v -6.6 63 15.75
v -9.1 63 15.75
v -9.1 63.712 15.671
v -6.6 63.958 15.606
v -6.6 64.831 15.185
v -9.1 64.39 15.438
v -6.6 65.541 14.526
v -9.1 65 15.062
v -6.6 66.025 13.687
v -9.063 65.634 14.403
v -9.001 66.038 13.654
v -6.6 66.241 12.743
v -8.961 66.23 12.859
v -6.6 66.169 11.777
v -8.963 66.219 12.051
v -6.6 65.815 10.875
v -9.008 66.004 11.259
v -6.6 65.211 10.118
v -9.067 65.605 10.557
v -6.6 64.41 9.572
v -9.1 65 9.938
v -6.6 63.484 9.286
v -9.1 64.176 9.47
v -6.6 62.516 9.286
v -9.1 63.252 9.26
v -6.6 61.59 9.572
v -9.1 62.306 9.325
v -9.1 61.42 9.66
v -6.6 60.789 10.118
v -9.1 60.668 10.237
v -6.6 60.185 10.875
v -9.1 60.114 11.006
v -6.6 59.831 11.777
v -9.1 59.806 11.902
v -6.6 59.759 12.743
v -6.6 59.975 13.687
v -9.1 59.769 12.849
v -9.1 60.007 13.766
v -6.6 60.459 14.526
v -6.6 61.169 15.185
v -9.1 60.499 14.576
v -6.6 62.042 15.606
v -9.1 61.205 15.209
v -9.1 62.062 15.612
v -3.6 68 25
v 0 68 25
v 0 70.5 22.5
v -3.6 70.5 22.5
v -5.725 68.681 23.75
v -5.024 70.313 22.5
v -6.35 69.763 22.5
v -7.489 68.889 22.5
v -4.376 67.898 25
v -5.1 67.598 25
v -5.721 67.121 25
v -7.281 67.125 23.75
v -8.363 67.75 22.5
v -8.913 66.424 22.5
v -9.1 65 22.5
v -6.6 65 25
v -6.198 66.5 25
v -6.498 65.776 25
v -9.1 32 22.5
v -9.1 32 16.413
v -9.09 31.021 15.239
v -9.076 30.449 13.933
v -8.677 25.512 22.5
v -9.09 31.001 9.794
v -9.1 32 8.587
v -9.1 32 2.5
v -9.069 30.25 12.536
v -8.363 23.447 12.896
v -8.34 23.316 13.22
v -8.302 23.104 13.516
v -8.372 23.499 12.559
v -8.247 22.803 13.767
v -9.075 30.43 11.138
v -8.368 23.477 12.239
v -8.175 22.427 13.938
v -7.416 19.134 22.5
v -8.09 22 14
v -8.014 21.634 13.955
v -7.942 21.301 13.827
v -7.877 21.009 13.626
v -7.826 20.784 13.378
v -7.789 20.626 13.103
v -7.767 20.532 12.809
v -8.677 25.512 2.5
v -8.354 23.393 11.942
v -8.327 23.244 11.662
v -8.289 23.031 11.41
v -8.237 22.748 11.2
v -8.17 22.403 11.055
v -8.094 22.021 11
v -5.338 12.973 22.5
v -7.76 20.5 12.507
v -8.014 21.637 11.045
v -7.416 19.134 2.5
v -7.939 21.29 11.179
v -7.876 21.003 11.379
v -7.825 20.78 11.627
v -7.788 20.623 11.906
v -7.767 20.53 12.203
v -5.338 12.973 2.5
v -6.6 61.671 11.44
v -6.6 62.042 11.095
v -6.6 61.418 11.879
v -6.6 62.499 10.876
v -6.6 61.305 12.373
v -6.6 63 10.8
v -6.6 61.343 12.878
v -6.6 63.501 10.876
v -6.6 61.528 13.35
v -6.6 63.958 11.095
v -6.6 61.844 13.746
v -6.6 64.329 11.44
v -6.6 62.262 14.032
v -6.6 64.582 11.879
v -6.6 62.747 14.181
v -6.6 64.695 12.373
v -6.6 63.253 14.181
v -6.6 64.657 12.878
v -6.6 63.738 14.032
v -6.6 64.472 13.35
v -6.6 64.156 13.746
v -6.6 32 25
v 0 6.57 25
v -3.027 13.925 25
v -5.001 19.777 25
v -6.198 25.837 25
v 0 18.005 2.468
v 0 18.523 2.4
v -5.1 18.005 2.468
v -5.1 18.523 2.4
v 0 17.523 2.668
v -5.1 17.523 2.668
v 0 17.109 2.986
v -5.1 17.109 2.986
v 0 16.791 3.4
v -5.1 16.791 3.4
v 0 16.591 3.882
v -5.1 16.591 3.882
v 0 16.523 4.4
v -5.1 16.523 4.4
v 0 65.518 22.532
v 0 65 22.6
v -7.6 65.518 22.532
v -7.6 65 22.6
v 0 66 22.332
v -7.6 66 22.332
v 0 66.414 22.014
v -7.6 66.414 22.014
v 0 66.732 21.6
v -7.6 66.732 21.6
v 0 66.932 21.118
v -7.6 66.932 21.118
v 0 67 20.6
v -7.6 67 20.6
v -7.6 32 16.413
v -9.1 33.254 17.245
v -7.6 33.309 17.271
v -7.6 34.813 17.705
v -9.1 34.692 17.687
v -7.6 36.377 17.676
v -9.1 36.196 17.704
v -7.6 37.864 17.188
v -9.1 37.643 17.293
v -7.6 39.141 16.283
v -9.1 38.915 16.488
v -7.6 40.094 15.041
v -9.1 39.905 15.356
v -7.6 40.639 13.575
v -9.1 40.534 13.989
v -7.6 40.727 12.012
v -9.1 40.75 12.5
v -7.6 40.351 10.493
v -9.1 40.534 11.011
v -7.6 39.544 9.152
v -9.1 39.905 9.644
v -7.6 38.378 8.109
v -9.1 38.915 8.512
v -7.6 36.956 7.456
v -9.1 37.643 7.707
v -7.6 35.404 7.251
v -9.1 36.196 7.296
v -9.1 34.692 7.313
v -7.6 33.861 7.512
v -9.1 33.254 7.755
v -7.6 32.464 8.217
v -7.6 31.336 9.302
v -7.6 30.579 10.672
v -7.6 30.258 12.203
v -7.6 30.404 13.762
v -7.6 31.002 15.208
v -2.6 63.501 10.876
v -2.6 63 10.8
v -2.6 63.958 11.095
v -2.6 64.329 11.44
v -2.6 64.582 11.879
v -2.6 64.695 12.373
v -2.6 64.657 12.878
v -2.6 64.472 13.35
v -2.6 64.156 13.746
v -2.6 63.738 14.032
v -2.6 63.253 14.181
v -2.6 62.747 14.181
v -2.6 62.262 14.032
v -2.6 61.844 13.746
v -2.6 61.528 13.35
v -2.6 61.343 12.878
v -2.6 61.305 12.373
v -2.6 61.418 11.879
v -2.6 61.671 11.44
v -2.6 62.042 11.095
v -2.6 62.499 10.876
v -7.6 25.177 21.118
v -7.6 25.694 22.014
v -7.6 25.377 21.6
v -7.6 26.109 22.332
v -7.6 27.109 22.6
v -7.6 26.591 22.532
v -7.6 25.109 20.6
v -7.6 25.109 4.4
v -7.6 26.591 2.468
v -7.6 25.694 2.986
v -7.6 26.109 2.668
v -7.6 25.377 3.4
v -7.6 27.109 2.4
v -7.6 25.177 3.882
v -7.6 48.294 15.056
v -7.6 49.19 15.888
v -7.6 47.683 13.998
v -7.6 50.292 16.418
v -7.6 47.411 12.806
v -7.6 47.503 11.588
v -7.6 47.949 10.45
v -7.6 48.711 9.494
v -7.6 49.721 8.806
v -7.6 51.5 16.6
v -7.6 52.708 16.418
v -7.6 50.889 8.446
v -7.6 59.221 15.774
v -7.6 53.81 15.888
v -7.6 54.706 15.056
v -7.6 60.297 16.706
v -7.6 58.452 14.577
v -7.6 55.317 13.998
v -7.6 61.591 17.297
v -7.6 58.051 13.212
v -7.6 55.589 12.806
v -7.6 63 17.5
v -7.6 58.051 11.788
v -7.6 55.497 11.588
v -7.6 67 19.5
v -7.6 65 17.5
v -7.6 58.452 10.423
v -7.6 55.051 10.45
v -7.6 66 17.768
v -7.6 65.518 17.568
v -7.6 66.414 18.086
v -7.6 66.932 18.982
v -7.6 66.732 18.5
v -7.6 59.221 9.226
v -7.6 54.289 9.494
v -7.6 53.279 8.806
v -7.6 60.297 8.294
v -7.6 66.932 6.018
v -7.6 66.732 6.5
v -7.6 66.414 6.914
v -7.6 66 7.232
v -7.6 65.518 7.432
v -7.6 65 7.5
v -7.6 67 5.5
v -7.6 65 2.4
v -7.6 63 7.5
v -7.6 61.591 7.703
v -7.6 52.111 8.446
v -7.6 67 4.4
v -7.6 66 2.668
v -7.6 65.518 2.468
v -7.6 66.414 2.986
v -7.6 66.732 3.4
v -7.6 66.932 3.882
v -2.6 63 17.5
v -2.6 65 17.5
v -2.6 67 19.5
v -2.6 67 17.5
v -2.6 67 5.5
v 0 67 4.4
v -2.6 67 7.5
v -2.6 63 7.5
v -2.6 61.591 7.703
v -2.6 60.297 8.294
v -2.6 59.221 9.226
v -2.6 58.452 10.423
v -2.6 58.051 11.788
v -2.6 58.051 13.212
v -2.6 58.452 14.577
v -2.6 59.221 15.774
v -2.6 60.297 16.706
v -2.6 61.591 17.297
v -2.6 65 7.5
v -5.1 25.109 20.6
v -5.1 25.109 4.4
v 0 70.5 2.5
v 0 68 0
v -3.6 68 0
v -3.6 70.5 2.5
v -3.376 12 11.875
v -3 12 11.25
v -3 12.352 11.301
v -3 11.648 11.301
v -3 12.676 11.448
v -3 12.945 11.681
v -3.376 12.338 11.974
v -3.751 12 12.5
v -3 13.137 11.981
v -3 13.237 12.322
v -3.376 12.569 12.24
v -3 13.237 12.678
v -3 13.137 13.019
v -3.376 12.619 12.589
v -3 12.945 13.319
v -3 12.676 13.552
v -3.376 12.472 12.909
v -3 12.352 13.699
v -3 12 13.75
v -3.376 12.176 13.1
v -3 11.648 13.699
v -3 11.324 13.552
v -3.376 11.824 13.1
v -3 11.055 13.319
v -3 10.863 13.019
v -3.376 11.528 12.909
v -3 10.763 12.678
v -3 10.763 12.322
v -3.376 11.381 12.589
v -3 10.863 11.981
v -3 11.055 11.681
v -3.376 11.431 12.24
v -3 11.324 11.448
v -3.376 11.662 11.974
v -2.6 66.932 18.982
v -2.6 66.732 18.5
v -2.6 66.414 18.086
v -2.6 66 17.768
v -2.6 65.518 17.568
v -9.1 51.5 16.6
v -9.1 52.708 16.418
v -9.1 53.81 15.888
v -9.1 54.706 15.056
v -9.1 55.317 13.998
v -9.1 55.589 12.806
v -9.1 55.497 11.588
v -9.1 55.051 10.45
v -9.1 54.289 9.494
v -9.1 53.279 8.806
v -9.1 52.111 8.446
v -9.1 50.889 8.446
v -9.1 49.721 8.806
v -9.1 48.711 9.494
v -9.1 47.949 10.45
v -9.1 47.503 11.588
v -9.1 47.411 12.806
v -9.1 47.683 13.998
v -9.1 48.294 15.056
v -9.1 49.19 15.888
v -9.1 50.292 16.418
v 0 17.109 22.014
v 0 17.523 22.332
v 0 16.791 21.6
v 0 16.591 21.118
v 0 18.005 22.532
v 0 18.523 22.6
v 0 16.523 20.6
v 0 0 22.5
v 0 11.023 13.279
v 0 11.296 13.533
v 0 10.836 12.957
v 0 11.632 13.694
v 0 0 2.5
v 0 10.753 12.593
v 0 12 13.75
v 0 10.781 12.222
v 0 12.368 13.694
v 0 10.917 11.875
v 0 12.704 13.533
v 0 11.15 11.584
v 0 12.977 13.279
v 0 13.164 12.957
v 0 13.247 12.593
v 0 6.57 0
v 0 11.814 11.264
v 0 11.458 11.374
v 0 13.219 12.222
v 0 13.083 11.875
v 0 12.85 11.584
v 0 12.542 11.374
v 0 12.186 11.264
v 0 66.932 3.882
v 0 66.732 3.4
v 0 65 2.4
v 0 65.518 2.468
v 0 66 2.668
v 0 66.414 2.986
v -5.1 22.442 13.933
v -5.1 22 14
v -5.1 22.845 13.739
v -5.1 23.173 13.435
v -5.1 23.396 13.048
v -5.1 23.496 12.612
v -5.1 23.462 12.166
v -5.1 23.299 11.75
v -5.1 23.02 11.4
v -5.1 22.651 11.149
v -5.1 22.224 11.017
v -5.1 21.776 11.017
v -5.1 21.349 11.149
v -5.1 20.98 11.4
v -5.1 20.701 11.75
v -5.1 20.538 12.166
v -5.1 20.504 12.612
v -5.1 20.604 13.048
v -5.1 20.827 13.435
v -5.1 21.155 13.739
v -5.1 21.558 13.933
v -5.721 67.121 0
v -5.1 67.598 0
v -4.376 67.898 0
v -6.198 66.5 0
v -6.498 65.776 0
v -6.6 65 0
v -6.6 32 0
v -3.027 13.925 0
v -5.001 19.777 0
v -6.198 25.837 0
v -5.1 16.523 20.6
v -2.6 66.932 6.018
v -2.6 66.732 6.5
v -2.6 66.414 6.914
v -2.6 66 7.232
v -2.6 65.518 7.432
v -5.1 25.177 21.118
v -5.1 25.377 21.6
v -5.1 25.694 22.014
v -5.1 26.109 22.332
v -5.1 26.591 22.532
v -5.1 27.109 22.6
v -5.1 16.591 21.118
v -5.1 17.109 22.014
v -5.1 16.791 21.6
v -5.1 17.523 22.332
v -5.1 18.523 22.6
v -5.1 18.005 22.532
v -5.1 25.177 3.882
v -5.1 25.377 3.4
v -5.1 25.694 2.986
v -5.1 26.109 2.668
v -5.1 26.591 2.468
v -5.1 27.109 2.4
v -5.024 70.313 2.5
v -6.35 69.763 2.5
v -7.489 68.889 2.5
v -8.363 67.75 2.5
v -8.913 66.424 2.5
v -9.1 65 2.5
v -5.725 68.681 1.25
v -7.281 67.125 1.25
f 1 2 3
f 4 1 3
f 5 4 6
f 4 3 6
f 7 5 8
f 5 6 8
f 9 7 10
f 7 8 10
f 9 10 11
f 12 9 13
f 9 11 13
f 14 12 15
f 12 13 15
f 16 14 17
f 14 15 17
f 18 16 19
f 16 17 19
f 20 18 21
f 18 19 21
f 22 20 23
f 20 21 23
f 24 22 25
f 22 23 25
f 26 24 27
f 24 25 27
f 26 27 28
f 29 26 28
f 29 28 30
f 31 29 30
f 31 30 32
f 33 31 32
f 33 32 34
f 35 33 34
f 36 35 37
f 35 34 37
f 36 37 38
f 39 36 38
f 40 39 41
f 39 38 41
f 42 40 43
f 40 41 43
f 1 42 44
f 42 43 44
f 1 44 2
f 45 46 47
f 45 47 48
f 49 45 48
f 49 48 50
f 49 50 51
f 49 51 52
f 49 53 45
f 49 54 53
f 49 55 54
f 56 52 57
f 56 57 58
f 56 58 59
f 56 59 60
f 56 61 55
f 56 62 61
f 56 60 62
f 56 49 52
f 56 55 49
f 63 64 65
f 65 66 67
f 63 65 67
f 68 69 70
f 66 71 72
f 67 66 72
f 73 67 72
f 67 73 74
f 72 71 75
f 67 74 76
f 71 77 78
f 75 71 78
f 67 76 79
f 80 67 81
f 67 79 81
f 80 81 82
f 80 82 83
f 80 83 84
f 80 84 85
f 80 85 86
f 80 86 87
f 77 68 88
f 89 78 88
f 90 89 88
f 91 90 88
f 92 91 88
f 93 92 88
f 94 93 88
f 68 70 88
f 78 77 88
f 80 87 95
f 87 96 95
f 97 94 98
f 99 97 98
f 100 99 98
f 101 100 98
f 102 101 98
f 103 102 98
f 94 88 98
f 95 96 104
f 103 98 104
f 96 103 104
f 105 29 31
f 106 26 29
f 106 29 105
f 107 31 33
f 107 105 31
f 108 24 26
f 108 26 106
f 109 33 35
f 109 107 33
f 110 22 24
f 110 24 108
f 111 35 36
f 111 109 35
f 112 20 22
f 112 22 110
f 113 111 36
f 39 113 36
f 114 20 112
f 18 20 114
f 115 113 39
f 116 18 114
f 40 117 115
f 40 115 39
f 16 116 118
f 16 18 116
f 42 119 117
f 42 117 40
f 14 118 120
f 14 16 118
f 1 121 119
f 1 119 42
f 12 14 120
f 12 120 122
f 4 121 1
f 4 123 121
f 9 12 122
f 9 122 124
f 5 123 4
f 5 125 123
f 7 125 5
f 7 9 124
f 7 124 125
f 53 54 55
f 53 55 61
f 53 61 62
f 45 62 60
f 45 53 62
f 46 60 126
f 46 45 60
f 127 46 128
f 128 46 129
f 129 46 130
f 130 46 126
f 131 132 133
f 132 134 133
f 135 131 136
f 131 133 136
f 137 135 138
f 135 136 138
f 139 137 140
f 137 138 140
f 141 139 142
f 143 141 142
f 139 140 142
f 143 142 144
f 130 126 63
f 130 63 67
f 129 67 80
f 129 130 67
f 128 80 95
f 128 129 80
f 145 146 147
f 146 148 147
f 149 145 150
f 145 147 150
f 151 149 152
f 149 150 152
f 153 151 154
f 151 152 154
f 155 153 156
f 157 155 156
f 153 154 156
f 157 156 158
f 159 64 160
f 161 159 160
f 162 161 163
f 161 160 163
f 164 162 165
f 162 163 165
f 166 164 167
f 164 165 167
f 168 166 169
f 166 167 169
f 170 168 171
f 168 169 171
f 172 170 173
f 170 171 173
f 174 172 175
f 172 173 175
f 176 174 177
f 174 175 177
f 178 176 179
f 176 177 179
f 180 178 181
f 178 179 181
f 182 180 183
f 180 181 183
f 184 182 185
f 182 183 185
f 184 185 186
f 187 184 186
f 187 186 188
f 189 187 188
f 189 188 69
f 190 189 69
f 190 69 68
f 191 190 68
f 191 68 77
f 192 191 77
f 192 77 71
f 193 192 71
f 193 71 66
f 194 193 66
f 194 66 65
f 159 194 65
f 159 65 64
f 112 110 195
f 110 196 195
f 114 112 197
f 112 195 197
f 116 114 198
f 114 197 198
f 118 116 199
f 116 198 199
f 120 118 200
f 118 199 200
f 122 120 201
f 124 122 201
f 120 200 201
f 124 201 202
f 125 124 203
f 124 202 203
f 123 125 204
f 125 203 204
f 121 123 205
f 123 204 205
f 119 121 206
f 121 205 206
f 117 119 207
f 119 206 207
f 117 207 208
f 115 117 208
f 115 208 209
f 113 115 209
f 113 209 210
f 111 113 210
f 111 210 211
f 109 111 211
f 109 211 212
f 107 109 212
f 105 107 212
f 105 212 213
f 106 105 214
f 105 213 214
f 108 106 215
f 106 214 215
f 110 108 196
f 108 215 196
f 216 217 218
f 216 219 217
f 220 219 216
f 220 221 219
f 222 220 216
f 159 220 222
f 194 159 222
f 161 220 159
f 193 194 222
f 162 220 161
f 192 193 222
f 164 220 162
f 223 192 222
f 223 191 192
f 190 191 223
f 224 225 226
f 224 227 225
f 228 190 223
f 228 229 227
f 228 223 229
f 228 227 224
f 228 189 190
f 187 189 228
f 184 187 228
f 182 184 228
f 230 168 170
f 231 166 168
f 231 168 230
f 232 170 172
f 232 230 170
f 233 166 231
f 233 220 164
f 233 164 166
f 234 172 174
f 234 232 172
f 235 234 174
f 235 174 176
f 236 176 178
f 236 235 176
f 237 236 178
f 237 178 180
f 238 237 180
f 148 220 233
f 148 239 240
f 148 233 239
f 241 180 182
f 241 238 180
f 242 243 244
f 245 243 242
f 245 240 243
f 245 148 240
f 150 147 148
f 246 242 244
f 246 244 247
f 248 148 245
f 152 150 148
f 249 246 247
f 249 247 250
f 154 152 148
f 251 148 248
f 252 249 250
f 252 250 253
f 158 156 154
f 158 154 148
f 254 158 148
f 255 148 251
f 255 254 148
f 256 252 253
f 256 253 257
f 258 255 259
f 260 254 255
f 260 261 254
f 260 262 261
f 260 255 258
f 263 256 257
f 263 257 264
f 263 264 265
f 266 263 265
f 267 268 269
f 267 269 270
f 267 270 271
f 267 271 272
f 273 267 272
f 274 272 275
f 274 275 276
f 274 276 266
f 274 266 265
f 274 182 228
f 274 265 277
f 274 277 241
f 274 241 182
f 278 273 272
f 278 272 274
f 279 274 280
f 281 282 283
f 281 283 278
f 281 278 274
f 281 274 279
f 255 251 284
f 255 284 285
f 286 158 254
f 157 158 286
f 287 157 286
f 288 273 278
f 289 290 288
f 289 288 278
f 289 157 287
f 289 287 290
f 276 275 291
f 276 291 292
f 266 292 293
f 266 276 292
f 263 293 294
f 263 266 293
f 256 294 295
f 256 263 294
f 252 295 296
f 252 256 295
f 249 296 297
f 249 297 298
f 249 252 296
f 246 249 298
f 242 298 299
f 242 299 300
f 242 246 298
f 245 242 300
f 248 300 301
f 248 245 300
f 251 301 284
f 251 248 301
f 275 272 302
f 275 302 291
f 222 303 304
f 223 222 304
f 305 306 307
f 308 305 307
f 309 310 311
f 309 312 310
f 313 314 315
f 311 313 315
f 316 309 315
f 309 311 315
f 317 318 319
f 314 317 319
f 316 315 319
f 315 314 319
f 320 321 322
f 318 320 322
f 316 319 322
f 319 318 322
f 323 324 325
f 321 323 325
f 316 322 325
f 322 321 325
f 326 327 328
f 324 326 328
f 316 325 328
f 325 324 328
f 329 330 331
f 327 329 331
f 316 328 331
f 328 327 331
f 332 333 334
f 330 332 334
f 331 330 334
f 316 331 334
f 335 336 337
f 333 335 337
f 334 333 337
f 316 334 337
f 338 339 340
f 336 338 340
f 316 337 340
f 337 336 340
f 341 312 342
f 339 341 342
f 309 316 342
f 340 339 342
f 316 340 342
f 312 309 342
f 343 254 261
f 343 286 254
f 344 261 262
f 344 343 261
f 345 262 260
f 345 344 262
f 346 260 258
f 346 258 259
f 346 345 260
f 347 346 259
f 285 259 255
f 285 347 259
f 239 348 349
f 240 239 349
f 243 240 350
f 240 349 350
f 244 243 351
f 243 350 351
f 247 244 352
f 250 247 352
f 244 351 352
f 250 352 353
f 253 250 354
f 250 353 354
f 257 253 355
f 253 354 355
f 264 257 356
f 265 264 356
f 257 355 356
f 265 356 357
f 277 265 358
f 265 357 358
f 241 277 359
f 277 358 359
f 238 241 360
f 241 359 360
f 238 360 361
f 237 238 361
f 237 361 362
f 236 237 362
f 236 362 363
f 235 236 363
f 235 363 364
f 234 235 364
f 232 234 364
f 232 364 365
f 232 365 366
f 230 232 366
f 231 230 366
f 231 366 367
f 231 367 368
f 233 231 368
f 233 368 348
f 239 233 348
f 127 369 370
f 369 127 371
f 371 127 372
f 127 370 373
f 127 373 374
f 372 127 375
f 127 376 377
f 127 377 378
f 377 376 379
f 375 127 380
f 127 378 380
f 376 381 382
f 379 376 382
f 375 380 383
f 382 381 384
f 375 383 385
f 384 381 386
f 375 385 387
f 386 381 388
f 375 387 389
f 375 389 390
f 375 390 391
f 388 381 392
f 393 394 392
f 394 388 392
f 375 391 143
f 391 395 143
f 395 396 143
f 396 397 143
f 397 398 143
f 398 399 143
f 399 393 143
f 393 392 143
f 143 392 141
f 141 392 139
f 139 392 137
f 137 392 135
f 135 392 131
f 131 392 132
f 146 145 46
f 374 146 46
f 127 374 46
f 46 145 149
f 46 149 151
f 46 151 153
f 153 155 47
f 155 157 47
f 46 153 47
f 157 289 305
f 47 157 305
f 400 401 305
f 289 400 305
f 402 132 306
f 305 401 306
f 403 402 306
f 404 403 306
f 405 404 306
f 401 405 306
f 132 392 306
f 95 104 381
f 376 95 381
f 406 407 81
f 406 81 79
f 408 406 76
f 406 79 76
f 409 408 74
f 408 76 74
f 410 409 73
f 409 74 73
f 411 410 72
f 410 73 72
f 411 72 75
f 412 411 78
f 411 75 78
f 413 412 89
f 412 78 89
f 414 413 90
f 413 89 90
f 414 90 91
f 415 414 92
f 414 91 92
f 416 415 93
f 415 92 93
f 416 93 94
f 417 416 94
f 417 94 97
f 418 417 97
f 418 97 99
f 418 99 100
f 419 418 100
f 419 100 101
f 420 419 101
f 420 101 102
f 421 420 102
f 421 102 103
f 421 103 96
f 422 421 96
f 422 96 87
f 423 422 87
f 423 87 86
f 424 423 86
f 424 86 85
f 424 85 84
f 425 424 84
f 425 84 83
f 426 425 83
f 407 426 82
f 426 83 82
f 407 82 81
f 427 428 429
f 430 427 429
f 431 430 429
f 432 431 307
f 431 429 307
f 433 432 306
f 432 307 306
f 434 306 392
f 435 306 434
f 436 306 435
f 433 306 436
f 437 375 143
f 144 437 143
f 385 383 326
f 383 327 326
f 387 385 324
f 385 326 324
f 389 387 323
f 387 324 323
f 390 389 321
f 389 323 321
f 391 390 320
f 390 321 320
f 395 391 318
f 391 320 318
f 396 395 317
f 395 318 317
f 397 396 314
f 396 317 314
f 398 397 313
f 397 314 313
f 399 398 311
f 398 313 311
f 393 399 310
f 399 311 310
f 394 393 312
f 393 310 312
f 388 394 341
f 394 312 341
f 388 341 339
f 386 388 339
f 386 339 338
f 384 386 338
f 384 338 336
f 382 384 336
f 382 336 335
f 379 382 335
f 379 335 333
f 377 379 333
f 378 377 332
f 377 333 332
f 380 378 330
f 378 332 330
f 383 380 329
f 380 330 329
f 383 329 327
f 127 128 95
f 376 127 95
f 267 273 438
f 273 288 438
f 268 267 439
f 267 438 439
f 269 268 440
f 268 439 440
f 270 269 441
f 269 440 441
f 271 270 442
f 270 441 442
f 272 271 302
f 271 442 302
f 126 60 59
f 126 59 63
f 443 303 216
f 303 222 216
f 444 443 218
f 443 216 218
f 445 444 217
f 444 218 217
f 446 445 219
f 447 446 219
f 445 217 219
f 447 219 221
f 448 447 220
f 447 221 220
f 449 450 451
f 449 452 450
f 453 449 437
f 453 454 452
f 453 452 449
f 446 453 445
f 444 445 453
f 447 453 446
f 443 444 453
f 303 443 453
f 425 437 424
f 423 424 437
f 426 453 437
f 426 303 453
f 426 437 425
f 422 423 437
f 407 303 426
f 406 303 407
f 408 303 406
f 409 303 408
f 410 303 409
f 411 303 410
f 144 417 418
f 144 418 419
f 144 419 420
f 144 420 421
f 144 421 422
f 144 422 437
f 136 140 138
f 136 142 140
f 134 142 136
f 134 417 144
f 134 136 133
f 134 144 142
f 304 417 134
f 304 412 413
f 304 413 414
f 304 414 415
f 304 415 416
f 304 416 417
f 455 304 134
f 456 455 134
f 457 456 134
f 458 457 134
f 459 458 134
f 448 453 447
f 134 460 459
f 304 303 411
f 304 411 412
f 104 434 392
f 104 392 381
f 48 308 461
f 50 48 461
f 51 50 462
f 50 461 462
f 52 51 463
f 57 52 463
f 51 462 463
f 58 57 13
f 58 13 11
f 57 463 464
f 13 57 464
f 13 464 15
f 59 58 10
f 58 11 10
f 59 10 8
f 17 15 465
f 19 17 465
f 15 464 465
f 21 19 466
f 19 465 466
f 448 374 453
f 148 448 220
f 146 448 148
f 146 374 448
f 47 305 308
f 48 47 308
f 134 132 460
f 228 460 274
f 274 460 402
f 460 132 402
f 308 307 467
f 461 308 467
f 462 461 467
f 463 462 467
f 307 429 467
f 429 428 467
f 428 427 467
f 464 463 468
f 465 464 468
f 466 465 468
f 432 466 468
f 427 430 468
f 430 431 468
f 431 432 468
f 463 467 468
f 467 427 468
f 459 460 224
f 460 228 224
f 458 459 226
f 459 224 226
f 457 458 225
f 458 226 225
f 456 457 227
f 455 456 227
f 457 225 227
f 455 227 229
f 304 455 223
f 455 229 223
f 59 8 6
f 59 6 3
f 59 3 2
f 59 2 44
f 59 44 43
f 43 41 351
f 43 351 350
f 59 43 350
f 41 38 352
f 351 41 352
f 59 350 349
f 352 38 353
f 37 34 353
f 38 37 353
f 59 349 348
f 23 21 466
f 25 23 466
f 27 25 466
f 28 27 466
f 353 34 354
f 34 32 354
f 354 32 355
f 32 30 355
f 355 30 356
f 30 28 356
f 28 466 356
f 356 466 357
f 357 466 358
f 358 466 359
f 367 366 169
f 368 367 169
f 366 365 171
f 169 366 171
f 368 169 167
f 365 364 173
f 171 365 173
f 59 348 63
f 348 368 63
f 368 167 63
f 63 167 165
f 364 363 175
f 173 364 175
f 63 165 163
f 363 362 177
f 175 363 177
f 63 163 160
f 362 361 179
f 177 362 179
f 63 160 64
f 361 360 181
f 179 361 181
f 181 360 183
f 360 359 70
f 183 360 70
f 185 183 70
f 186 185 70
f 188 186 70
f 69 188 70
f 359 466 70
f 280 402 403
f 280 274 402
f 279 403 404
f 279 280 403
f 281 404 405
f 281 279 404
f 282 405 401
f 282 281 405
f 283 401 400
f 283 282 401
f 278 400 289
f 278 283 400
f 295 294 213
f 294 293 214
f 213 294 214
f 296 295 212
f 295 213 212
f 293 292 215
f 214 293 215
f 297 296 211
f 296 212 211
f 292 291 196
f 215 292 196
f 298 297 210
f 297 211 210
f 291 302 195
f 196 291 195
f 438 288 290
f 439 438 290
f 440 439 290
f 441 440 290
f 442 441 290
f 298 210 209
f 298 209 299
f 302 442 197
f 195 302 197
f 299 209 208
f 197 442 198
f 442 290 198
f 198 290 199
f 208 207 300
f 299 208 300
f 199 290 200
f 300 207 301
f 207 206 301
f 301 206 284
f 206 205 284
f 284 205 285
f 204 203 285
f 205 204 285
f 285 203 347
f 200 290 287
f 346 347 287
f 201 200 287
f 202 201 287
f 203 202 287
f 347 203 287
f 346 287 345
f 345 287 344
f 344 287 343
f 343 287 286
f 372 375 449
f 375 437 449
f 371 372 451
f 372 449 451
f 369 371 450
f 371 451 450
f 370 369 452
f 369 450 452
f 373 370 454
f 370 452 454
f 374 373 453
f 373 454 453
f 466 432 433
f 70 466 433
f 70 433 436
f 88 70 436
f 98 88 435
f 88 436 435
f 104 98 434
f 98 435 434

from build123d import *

# Parameters (mm, degrees)
EXTRUDE_1_DEPTH             = 25
CHAMFER_5_SIZE              = 2.5
SKETCH_6_W                  = 20.2
SKETCH_6_H                  = 41.891303575
CUT_EXTRUDE_2_DEPTH         = 7.6
SKETCH_7_R                  = 5.25
SKETCH_7_R_2                = 4.1
CUT_EXTRUDE_3_DEPTH         = 76.352903063
SKETCH_8_W                  = 20.2
SKETCH_8_H                  = 8.585894888
CUT_EXTRUDE_4_DEPTH         = 5.1
FILLET_2_R                  = 2
CUT_EXTRUDE_5_REACH         = 77.353
SKETCH_10_R                 = 1.5
M3X0_51_D                   = 2.5
M3X0_51_DEPTH               = 3
M3X0_51_TIP                 = 0.751075774
EXTRUDE_3_DEPTH             = 5
FILLET_3_R                  = 2
HOLE_WIZARD_M32_D           = 3.4
HOLE_WIZARD_M32_CBORE_D     = 6.5
HOLE_WIZARD_M32_CBORE_DEPTH = 2.5


with BuildPart() as part:
    # Эскиз1 → Бобышка-Вытянуть1 (new body)
    with BuildSketch(Plane.XY):
        with BuildLine():
            Line((0, 0), (0, 70.5))
            Line((0, 70.5), (-3.6, 70.5))
            ThreePointArc((-3.6, 70.5), (-7.489087297, 68.889087297), (-9.1, 65))
            Line((-9.1, 65), (-9.1, 32))
            ThreePointArc((-9.1, 32), (-8.15059166, 22.302605618), (-5.338421688, 12.97348272))
            Line((-5.338421688, 12.97348272), (0, 0))
        make_face()
    extrude(amount=EXTRUDE_1_DEPTH)

    # Фаска5
    chamfer_5_edges = [part.edges().sort_by_distance(p)[0] for p in [
        (-8.15059166, 22.302605618, 25),
        (-2.669210844, 6.48674136, 25),
        (-1.8, 70.5, 25),
        (-7.489087297, 68.889087297, 25),
        (-1.8, 70.5, 0),
        (-2.669210844, 6.48674136, 0),
        (-9.1, 48.5, 25),
        (-8.15059166, 22.302605618, 0),
        (-9.1, 48.5, 0),
        (-7.489087297, 68.889087297, 0),
    ]]
    chamfer(chamfer_5_edges, length=CHAMFER_5_SIZE)

    # Эскиз6 → Вырез-Вытянуть2 (cut)
    with BuildSketch(Plane(origin=(0, 0, 0), x_dir=(0, 0, -1), z_dir=(1, 0, 0))):
        with Locations((-12.5, 46.054348213)):
            Rectangle(SKETCH_6_W, SKETCH_6_H)
    extrude(amount=-CUT_EXTRUDE_2_DEPTH, mode=Mode.SUBTRACT)

    # Эскиз7 → Вырез-Вытянуть3 (cut, through all)
    with BuildSketch(Plane.ZY.offset(9.1)):
        with Locations(Location((12.5, 35.5, 0), (0, 0, 318.189685104))):
            Circle(SKETCH_7_R)
        with Locations((12.5, 51.5)):
            Circle(SKETCH_7_R_2)
    extrude(amount=-CUT_EXTRUDE_3_DEPTH, mode=Mode.SUBTRACT)

    # Эскиз8 → Вырез-Вытянуть4 (cut)
    with BuildSketch(Plane(origin=(0, 0, 0), x_dir=(0, 0, -1), z_dir=(1, 0, 0))):
        with Locations((-12.5, 20.815748981)):
            Rectangle(SKETCH_8_W, SKETCH_8_H)
    extrude(amount=-CUT_EXTRUDE_4_DEPTH, mode=Mode.SUBTRACT)

    # Скругление2
    fillet_2_edges = [part.edges().sort_by_distance(p)[0] for p in [
        (-3.8, 67, 2.4),
        (-6.35, 25.108696425, 2.4),
        (-6.35, 25.108696425, 22.6),
        (-3.8, 67, 22.6),
        (-2.55, 16.522801537, 22.6),
        (-2.55, 16.522801537, 2.4),
    ]]
    fillet(fillet_2_edges, radius=FILLET_2_R)

    # Эскиз10 → Вырез-Вытянуть5 (cut, up to next)
    with BuildSketch(Plane.ZY.offset(9.1), mode=Mode.PRIVATE) as cut_extrude_5_sk1:
        with Locations((12.5, 22)):
            Circle(SKETCH_10_R)
    cut_extrude_5_tool1 = extrude(cut_extrude_5_sk1.sketch, amount=-CUT_EXTRUDE_5_REACH, mode=Mode.PRIVATE) & part.part
    add(cut_extrude_5_tool1.solids().sort_by_distance((-9.1, 22, 12.5))[0], mode=Mode.SUBTRACT)

    # Отверстие обработанное метчиком M3x0.51
    with Locations(Plane(origin=(0, 0, 0), x_dir=(0, 0, -1), z_dir=(1, 0, 0))):
        with Locations((-12.5, 12)):
            Hole(M3X0_51_D / 2, depth=M3X0_51_DEPTH)
            with Locations((0, 0, -(M3X0_51_DEPTH + M3X0_51_TIP / 2))):  # 118° drill point
                Cone(0, M3X0_51_D / 2, M3X0_51_TIP, mode=Mode.SUBTRACT)

    # Эскиз22 → Бобышка-Вытянуть3 (add)
    with BuildSketch(Plane(origin=(-7.6, 0, 0), x_dir=(0, 0, -1), z_dir=(1, 0, 0))):
        with BuildLine():
            Line((-17.5, 63), (-17.5, 67))
            Line((-17.5, 67), (-7.5, 67))
            Line((-7.5, 67), (-7.5, 63))
            ThreePointArc((-7.5, 63), (-12.5, 58), (-17.5, 63))
        make_face()
    extrude(amount=EXTRUDE_3_DEPTH)

    # Скругление3
    fillet_3_edges = [part.edges().sort_by_distance(p)[0] for p in [
        (-5.1, 67, 7.5),
        (-5.1, 67, 17.5),
    ]]
    fillet(fillet_3_edges, radius=FILLET_3_R)

    # Цековка для винта с внутренним шестигранником M32 (through all)
    with Locations(Plane.ZY.offset(9.1)):
        with Locations((12.5, 63)):
            CounterBoreHole(HOLE_WIZARD_M32_D / 2, HOLE_WIZARD_M32_CBORE_D / 2, HOLE_WIZARD_M32_CBORE_DEPTH)


solid = part.part
